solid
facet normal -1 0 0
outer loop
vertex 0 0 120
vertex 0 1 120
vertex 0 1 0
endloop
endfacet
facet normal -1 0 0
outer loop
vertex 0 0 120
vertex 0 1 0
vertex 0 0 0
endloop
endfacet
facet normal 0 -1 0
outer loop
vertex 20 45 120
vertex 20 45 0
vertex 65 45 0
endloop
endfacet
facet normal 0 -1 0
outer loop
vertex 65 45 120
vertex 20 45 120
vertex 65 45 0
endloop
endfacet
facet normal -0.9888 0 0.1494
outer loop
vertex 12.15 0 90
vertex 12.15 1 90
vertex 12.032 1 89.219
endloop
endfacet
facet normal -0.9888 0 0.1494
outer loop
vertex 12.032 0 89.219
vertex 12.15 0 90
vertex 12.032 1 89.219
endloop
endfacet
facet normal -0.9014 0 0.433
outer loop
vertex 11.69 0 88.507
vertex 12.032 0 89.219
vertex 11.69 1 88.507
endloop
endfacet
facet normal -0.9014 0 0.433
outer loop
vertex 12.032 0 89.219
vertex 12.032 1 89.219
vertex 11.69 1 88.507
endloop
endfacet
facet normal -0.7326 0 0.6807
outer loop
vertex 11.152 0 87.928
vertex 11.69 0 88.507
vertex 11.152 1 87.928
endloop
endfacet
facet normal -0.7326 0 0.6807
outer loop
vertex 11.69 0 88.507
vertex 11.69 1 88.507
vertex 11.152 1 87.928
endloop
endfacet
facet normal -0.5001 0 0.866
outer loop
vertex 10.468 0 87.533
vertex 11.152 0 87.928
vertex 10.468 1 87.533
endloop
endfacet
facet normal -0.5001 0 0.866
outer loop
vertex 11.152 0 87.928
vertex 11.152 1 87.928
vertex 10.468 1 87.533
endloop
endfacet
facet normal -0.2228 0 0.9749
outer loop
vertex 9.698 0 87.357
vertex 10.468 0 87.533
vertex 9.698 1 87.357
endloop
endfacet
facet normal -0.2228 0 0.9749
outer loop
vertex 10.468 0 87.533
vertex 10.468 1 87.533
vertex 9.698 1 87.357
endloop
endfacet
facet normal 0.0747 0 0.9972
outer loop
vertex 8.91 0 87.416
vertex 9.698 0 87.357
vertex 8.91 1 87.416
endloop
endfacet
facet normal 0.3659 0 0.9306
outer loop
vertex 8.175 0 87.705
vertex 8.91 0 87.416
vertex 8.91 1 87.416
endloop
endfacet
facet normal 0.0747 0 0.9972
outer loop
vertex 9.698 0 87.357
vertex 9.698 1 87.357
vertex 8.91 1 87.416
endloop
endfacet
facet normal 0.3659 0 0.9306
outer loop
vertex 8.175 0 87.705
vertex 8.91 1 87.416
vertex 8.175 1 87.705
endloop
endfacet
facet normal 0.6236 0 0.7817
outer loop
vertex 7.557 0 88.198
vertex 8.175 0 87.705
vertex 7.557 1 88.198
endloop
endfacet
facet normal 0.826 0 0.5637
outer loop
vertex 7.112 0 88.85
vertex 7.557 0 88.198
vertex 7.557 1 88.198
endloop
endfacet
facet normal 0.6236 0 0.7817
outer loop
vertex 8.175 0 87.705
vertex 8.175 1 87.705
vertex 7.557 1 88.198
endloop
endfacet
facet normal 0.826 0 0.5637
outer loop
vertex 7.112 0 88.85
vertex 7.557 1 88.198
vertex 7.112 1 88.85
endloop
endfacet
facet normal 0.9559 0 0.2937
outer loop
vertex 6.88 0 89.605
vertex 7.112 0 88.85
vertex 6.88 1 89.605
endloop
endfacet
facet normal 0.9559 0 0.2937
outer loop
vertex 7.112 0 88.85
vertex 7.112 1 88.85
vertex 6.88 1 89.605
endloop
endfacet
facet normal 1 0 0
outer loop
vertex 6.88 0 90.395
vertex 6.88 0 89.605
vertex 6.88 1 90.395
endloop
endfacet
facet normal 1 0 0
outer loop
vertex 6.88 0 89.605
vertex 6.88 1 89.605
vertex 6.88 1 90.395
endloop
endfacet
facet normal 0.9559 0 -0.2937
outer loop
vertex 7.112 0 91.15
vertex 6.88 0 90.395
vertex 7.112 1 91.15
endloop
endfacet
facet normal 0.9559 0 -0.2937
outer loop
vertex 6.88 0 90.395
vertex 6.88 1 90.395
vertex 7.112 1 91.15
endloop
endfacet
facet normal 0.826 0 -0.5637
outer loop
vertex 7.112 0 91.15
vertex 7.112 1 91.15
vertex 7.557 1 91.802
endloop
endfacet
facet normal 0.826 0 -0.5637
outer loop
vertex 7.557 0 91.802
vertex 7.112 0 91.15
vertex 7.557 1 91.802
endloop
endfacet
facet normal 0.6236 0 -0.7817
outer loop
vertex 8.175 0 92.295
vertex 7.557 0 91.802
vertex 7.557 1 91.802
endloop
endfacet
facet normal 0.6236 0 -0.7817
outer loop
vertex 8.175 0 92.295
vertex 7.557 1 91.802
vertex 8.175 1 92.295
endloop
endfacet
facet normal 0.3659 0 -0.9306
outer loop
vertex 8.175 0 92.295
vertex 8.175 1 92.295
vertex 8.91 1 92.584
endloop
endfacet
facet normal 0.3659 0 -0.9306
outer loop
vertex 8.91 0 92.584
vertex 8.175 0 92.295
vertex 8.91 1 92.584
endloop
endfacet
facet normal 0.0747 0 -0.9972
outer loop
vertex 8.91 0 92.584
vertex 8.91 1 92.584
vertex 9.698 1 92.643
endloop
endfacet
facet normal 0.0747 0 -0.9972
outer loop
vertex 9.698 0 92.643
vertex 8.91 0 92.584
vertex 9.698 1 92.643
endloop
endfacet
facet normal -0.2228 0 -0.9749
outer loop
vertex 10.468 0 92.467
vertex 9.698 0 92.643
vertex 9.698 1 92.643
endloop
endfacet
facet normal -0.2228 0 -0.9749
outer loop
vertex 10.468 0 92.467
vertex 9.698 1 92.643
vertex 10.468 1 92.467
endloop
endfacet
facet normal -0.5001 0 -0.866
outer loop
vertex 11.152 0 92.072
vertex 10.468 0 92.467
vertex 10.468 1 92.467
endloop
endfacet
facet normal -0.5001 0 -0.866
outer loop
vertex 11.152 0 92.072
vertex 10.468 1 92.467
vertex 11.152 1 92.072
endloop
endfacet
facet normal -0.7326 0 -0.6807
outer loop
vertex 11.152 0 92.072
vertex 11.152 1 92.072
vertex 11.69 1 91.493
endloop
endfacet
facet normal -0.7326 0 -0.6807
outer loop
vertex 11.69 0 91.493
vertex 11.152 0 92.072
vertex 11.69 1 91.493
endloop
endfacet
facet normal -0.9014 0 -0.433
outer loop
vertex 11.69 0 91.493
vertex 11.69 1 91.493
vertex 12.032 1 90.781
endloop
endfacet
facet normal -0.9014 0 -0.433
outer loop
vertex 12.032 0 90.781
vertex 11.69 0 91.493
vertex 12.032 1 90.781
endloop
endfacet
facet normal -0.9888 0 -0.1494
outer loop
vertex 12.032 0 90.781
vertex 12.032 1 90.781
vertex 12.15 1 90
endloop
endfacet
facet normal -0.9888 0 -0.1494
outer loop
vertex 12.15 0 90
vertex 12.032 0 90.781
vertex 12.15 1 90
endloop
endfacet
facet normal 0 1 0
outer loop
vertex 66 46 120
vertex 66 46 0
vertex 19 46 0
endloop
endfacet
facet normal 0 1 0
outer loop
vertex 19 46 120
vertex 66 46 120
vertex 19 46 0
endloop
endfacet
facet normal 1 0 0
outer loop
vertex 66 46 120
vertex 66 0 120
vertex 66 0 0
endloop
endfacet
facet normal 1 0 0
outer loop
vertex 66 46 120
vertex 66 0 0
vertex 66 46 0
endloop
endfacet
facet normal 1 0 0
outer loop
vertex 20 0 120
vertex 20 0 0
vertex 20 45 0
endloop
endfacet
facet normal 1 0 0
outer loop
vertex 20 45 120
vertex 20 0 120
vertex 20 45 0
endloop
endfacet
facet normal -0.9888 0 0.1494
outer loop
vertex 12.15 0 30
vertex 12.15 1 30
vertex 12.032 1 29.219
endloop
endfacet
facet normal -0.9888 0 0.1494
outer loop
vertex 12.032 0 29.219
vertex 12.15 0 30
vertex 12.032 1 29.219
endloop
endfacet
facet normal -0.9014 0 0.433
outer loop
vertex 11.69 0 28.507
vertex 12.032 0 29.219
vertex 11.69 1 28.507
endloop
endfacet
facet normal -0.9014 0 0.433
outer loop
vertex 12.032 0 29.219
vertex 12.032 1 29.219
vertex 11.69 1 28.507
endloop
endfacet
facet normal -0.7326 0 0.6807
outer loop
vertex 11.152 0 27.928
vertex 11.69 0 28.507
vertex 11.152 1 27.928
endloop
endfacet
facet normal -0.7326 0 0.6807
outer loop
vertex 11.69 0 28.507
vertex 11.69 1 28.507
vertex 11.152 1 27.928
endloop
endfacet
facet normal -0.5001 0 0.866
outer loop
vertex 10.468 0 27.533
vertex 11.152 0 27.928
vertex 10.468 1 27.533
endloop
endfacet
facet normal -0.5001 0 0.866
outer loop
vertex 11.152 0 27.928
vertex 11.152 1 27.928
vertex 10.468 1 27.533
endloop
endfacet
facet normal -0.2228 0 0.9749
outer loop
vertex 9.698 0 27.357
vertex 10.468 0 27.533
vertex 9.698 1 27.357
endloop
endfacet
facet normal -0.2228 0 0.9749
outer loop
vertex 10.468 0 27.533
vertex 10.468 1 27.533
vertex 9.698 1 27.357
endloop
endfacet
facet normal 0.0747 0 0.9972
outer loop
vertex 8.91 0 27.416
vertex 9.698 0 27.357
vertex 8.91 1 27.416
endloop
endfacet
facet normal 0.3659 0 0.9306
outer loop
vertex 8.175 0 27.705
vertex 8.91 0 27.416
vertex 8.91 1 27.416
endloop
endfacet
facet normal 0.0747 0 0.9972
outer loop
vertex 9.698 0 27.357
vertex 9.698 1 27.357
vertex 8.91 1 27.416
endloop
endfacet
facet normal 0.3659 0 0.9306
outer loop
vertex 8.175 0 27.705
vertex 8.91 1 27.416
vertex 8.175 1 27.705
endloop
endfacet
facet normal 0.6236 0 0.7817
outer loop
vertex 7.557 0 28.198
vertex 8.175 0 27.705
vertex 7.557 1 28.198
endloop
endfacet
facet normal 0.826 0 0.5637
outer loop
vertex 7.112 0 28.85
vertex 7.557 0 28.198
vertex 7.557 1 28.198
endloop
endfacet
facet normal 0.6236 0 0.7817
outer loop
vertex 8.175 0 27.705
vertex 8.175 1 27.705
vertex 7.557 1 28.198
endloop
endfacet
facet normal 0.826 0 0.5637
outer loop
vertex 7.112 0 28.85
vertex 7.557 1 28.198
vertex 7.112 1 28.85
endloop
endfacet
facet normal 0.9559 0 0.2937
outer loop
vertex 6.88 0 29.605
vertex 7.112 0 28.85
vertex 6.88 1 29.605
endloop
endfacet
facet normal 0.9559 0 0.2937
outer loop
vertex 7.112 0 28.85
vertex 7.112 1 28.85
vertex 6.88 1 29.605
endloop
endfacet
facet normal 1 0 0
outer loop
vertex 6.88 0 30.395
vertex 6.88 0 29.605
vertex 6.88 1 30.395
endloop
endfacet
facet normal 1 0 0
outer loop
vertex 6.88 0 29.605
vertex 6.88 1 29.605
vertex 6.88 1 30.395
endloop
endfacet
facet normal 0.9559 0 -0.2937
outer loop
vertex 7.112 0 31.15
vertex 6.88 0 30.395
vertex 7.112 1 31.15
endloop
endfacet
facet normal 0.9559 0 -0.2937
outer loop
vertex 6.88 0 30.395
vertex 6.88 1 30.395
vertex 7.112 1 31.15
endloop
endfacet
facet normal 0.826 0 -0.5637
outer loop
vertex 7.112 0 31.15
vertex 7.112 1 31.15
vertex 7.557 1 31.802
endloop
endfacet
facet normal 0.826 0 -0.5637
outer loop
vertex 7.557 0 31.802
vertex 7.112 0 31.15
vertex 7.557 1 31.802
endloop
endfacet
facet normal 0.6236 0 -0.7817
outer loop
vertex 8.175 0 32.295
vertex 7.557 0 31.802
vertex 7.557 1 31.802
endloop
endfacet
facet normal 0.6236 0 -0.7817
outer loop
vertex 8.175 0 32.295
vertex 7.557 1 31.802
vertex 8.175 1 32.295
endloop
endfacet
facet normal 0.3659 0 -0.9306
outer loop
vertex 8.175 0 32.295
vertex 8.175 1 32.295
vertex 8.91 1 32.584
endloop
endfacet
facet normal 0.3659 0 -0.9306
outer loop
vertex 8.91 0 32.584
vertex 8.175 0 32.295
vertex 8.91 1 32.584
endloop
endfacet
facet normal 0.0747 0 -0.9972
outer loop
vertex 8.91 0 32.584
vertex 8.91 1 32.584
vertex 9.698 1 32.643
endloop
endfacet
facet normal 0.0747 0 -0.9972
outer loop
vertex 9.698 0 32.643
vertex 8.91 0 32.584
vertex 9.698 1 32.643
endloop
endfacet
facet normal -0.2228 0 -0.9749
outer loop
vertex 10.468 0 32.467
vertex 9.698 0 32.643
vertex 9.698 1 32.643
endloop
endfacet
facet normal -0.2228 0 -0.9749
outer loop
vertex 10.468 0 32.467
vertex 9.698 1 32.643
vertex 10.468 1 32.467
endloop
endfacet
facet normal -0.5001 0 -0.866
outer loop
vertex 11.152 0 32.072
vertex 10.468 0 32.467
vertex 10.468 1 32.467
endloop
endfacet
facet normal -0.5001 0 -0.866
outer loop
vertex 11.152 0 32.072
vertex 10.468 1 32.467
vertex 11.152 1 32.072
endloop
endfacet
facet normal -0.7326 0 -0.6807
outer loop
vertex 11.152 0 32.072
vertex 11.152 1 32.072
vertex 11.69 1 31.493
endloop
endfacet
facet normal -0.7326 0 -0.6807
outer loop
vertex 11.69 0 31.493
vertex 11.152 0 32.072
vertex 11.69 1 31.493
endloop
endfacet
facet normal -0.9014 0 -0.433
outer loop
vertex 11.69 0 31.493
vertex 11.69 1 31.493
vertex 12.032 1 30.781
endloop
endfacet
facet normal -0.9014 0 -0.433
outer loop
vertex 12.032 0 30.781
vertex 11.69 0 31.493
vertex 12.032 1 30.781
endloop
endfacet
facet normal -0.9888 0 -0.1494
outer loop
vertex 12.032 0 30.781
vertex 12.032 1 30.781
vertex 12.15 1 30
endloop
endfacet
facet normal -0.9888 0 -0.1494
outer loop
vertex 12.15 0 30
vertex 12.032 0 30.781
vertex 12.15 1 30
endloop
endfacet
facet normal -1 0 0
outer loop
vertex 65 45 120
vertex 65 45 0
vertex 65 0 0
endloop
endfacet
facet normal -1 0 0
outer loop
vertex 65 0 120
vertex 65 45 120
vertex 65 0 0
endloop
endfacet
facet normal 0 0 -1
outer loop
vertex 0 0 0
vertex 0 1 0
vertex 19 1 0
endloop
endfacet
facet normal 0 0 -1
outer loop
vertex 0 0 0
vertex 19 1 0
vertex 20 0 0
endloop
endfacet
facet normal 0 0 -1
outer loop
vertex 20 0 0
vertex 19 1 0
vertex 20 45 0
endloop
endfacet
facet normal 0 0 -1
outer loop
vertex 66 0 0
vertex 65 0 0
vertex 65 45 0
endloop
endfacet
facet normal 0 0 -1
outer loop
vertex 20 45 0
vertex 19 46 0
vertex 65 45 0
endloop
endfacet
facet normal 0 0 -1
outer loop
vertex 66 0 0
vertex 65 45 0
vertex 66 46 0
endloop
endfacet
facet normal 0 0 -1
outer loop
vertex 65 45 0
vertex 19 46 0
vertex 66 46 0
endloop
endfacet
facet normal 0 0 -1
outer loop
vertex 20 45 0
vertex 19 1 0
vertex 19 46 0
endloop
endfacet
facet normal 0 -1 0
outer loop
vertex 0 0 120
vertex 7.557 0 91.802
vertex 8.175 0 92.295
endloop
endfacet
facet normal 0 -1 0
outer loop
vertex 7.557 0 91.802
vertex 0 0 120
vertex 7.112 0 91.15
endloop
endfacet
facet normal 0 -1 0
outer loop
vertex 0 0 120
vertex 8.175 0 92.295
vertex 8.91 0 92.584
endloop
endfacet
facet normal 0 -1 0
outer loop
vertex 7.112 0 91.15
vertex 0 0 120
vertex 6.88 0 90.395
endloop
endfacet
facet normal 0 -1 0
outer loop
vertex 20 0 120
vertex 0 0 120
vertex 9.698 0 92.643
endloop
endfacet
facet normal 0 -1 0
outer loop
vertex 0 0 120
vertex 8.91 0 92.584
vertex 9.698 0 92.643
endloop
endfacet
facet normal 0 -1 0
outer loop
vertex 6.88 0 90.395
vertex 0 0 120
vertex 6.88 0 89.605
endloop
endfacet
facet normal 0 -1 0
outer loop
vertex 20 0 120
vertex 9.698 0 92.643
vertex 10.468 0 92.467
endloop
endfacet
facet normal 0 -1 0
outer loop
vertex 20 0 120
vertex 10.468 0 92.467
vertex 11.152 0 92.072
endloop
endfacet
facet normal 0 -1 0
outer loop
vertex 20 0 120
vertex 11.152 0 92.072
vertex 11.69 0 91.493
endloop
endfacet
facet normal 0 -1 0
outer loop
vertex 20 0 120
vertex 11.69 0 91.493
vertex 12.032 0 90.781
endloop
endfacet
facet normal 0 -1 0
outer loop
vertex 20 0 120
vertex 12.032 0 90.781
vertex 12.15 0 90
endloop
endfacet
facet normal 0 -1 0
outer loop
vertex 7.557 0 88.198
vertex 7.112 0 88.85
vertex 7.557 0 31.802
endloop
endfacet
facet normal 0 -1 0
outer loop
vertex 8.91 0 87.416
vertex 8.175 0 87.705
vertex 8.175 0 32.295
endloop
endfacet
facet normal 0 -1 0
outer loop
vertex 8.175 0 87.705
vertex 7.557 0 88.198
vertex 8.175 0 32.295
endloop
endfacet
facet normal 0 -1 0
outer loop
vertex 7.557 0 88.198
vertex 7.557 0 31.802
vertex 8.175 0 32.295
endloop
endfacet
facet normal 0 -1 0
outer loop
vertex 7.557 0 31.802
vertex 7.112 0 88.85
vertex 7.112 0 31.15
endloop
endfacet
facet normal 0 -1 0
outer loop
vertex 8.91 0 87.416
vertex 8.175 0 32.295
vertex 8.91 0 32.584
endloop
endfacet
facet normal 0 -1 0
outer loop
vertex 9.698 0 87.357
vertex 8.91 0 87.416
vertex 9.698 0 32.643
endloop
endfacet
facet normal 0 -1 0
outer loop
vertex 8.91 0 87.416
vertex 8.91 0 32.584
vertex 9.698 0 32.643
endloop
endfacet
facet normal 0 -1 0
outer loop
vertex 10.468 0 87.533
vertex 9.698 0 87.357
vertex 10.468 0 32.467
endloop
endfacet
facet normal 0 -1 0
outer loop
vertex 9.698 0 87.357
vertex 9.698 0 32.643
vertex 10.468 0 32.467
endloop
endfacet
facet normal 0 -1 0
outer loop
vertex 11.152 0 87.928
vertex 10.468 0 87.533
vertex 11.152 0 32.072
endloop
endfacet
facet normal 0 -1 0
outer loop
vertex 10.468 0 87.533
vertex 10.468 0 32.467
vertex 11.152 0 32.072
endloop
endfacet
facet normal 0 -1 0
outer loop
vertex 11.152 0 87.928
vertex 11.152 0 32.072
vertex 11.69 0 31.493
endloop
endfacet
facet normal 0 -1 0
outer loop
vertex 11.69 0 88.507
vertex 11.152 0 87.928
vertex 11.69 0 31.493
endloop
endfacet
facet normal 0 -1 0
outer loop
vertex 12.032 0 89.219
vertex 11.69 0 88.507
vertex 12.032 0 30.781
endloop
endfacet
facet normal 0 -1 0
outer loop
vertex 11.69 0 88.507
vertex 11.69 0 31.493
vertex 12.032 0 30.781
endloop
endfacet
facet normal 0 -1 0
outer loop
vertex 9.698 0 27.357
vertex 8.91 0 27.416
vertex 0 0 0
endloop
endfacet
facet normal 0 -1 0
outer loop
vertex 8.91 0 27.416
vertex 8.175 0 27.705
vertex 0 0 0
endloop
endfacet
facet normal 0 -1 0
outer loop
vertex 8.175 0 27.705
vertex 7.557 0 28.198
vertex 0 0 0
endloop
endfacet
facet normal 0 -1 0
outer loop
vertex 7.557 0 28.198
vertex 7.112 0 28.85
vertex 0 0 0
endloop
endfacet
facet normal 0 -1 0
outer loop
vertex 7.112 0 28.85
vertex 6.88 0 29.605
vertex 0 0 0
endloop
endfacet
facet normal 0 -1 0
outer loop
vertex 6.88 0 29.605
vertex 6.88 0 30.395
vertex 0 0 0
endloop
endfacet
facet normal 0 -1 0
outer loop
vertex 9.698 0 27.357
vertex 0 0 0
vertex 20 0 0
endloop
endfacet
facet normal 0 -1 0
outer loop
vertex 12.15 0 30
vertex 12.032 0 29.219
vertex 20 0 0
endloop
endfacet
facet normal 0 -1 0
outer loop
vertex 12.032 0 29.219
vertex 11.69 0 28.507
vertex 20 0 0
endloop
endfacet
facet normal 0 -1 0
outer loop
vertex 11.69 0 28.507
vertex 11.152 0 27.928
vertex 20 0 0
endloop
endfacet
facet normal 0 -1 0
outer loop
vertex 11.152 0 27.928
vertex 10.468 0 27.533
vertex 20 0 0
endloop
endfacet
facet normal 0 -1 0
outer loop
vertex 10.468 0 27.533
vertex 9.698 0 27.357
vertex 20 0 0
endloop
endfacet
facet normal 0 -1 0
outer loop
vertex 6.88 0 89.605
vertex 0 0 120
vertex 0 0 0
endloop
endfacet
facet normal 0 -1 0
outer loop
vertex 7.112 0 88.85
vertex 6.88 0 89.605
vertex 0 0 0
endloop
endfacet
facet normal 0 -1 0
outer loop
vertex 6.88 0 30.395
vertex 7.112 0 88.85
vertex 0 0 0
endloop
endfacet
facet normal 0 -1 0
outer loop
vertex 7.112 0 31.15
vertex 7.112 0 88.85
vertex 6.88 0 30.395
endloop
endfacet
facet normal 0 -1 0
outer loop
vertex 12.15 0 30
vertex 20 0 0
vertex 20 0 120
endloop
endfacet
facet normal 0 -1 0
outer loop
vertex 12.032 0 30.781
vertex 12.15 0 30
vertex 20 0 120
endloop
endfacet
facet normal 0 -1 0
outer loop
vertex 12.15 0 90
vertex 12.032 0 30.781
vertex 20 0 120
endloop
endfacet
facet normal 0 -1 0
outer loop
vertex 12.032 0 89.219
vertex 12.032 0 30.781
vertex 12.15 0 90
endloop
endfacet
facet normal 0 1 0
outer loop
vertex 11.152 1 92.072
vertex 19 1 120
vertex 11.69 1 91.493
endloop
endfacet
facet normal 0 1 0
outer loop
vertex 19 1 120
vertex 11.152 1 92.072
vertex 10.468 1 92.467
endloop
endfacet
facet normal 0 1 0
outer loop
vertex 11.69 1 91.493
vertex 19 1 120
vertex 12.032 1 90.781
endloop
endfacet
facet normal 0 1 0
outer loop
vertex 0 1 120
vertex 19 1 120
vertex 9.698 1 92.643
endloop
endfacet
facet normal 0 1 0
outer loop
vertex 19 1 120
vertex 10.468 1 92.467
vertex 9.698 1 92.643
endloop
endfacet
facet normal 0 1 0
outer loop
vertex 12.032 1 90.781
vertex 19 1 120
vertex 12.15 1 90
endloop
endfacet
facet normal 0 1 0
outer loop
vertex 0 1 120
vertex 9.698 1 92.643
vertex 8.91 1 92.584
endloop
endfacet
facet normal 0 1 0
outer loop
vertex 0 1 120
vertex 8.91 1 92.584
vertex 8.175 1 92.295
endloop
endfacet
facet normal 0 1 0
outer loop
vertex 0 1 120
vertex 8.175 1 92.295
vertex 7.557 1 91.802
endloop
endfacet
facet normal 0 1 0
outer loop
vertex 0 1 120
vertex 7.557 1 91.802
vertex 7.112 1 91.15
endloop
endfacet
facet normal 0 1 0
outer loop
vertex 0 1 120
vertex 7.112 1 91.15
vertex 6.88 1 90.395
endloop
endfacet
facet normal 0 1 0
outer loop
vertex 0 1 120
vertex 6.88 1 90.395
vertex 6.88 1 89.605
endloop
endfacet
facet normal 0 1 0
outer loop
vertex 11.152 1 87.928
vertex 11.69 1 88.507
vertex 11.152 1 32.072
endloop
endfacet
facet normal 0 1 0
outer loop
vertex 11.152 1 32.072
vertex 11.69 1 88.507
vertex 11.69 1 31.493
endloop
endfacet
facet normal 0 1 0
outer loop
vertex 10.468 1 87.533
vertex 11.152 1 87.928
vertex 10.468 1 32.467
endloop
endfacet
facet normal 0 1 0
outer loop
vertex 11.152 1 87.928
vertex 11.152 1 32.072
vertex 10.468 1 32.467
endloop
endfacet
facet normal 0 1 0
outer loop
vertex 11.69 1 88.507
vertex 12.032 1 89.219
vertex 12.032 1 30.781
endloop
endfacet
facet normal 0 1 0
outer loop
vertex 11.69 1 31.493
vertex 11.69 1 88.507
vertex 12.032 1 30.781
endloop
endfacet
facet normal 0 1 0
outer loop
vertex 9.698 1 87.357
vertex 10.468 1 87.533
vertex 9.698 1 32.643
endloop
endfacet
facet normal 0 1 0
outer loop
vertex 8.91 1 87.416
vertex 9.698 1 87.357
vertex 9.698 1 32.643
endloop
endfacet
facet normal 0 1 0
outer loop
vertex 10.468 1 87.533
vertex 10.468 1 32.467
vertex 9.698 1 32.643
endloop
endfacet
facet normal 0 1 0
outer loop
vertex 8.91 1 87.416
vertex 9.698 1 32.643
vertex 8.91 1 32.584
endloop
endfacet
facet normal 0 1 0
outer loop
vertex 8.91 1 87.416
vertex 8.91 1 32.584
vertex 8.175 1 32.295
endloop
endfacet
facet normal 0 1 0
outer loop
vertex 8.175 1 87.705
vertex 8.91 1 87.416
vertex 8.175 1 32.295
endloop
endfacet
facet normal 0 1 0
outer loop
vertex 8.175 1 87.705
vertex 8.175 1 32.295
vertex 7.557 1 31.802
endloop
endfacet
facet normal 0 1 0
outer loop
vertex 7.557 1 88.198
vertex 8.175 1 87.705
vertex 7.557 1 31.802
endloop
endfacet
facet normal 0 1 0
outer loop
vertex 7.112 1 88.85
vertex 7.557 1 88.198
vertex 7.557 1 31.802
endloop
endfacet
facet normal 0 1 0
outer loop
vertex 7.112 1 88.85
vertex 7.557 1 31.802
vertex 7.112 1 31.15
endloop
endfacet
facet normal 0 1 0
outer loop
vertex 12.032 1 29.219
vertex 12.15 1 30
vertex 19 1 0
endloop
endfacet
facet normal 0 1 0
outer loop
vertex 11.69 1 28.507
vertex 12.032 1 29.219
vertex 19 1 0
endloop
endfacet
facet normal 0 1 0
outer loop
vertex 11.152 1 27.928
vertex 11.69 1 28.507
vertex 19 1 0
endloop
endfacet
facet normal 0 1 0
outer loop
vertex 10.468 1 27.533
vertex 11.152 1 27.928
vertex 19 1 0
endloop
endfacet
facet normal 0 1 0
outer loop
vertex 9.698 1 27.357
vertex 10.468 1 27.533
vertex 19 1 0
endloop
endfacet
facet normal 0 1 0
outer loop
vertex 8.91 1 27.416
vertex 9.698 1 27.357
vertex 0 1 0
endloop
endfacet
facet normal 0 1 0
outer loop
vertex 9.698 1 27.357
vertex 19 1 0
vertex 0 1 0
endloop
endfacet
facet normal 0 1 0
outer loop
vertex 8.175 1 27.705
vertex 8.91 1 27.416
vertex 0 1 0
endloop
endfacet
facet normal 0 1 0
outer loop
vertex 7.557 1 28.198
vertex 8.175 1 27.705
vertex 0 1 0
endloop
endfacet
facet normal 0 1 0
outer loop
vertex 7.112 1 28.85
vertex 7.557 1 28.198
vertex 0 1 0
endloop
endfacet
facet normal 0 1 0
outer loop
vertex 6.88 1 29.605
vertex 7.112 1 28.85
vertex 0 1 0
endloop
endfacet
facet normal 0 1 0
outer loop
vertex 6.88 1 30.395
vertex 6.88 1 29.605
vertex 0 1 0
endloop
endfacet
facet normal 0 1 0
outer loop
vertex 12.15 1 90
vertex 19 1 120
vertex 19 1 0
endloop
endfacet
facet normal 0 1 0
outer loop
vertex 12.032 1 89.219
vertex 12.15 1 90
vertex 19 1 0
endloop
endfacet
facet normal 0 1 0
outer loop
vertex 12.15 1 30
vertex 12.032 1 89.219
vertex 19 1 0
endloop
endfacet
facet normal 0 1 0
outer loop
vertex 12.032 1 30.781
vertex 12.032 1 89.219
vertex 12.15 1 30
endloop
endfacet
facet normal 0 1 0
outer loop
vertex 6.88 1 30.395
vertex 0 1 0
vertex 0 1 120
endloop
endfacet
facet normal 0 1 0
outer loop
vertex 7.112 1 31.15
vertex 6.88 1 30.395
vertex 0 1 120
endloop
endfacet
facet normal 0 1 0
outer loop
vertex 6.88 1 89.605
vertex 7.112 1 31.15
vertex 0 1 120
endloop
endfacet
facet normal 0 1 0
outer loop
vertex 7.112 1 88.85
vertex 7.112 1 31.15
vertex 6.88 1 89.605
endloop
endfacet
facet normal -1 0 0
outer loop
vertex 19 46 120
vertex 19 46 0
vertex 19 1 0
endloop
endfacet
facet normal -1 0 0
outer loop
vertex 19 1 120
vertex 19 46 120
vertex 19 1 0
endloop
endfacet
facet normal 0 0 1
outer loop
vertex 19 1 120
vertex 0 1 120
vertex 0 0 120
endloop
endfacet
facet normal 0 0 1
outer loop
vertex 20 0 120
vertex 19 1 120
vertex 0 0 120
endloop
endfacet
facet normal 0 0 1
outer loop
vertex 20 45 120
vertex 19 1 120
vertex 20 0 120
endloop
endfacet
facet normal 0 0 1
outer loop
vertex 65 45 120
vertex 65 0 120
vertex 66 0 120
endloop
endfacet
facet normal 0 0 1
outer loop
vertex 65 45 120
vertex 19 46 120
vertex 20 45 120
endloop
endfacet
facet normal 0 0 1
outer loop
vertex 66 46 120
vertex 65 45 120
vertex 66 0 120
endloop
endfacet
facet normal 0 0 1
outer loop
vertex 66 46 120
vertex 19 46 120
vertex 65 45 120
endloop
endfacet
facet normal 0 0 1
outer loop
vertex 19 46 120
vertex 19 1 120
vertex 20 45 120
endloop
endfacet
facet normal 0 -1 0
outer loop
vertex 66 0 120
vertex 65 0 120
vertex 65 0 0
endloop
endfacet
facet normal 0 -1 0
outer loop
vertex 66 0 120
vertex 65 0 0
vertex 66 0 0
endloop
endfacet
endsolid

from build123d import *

# Parameters (mm, degrees)
BOSS_EXTRUDE1_DEPTH = 120
SKETCH2_R           = 2.65
CUT_EXTRUDE1_DEPTH  = 200


with BuildPart() as part:
    # Sketch1 → Boss-Extrude1 (new body)
    with BuildSketch(Plane.XY):
        Polygon((0, 0), (20, 0), (20, 45), (65, 45), (65, 0), (66, 0), (66, 46), (19, 46), (19, 1), (0, 1), align=None)
    extrude(amount=BOSS_EXTRUDE1_DEPTH)

    # Sketch2 → Cut-Extrude1 (cut)
    with BuildSketch(Plane(origin=(0, 1, 0), x_dir=(1, 0, 0), z_dir=(0, 1, 0))):
        with Locations((9.5, -30)):
            Circle(SKETCH2_R)
        with Locations((9.5, -90)):
            Circle(SKETCH2_R)
    extrude(amount=-CUT_EXTRUDE1_DEPTH, mode=Mode.SUBTRACT)


solid = part.part
